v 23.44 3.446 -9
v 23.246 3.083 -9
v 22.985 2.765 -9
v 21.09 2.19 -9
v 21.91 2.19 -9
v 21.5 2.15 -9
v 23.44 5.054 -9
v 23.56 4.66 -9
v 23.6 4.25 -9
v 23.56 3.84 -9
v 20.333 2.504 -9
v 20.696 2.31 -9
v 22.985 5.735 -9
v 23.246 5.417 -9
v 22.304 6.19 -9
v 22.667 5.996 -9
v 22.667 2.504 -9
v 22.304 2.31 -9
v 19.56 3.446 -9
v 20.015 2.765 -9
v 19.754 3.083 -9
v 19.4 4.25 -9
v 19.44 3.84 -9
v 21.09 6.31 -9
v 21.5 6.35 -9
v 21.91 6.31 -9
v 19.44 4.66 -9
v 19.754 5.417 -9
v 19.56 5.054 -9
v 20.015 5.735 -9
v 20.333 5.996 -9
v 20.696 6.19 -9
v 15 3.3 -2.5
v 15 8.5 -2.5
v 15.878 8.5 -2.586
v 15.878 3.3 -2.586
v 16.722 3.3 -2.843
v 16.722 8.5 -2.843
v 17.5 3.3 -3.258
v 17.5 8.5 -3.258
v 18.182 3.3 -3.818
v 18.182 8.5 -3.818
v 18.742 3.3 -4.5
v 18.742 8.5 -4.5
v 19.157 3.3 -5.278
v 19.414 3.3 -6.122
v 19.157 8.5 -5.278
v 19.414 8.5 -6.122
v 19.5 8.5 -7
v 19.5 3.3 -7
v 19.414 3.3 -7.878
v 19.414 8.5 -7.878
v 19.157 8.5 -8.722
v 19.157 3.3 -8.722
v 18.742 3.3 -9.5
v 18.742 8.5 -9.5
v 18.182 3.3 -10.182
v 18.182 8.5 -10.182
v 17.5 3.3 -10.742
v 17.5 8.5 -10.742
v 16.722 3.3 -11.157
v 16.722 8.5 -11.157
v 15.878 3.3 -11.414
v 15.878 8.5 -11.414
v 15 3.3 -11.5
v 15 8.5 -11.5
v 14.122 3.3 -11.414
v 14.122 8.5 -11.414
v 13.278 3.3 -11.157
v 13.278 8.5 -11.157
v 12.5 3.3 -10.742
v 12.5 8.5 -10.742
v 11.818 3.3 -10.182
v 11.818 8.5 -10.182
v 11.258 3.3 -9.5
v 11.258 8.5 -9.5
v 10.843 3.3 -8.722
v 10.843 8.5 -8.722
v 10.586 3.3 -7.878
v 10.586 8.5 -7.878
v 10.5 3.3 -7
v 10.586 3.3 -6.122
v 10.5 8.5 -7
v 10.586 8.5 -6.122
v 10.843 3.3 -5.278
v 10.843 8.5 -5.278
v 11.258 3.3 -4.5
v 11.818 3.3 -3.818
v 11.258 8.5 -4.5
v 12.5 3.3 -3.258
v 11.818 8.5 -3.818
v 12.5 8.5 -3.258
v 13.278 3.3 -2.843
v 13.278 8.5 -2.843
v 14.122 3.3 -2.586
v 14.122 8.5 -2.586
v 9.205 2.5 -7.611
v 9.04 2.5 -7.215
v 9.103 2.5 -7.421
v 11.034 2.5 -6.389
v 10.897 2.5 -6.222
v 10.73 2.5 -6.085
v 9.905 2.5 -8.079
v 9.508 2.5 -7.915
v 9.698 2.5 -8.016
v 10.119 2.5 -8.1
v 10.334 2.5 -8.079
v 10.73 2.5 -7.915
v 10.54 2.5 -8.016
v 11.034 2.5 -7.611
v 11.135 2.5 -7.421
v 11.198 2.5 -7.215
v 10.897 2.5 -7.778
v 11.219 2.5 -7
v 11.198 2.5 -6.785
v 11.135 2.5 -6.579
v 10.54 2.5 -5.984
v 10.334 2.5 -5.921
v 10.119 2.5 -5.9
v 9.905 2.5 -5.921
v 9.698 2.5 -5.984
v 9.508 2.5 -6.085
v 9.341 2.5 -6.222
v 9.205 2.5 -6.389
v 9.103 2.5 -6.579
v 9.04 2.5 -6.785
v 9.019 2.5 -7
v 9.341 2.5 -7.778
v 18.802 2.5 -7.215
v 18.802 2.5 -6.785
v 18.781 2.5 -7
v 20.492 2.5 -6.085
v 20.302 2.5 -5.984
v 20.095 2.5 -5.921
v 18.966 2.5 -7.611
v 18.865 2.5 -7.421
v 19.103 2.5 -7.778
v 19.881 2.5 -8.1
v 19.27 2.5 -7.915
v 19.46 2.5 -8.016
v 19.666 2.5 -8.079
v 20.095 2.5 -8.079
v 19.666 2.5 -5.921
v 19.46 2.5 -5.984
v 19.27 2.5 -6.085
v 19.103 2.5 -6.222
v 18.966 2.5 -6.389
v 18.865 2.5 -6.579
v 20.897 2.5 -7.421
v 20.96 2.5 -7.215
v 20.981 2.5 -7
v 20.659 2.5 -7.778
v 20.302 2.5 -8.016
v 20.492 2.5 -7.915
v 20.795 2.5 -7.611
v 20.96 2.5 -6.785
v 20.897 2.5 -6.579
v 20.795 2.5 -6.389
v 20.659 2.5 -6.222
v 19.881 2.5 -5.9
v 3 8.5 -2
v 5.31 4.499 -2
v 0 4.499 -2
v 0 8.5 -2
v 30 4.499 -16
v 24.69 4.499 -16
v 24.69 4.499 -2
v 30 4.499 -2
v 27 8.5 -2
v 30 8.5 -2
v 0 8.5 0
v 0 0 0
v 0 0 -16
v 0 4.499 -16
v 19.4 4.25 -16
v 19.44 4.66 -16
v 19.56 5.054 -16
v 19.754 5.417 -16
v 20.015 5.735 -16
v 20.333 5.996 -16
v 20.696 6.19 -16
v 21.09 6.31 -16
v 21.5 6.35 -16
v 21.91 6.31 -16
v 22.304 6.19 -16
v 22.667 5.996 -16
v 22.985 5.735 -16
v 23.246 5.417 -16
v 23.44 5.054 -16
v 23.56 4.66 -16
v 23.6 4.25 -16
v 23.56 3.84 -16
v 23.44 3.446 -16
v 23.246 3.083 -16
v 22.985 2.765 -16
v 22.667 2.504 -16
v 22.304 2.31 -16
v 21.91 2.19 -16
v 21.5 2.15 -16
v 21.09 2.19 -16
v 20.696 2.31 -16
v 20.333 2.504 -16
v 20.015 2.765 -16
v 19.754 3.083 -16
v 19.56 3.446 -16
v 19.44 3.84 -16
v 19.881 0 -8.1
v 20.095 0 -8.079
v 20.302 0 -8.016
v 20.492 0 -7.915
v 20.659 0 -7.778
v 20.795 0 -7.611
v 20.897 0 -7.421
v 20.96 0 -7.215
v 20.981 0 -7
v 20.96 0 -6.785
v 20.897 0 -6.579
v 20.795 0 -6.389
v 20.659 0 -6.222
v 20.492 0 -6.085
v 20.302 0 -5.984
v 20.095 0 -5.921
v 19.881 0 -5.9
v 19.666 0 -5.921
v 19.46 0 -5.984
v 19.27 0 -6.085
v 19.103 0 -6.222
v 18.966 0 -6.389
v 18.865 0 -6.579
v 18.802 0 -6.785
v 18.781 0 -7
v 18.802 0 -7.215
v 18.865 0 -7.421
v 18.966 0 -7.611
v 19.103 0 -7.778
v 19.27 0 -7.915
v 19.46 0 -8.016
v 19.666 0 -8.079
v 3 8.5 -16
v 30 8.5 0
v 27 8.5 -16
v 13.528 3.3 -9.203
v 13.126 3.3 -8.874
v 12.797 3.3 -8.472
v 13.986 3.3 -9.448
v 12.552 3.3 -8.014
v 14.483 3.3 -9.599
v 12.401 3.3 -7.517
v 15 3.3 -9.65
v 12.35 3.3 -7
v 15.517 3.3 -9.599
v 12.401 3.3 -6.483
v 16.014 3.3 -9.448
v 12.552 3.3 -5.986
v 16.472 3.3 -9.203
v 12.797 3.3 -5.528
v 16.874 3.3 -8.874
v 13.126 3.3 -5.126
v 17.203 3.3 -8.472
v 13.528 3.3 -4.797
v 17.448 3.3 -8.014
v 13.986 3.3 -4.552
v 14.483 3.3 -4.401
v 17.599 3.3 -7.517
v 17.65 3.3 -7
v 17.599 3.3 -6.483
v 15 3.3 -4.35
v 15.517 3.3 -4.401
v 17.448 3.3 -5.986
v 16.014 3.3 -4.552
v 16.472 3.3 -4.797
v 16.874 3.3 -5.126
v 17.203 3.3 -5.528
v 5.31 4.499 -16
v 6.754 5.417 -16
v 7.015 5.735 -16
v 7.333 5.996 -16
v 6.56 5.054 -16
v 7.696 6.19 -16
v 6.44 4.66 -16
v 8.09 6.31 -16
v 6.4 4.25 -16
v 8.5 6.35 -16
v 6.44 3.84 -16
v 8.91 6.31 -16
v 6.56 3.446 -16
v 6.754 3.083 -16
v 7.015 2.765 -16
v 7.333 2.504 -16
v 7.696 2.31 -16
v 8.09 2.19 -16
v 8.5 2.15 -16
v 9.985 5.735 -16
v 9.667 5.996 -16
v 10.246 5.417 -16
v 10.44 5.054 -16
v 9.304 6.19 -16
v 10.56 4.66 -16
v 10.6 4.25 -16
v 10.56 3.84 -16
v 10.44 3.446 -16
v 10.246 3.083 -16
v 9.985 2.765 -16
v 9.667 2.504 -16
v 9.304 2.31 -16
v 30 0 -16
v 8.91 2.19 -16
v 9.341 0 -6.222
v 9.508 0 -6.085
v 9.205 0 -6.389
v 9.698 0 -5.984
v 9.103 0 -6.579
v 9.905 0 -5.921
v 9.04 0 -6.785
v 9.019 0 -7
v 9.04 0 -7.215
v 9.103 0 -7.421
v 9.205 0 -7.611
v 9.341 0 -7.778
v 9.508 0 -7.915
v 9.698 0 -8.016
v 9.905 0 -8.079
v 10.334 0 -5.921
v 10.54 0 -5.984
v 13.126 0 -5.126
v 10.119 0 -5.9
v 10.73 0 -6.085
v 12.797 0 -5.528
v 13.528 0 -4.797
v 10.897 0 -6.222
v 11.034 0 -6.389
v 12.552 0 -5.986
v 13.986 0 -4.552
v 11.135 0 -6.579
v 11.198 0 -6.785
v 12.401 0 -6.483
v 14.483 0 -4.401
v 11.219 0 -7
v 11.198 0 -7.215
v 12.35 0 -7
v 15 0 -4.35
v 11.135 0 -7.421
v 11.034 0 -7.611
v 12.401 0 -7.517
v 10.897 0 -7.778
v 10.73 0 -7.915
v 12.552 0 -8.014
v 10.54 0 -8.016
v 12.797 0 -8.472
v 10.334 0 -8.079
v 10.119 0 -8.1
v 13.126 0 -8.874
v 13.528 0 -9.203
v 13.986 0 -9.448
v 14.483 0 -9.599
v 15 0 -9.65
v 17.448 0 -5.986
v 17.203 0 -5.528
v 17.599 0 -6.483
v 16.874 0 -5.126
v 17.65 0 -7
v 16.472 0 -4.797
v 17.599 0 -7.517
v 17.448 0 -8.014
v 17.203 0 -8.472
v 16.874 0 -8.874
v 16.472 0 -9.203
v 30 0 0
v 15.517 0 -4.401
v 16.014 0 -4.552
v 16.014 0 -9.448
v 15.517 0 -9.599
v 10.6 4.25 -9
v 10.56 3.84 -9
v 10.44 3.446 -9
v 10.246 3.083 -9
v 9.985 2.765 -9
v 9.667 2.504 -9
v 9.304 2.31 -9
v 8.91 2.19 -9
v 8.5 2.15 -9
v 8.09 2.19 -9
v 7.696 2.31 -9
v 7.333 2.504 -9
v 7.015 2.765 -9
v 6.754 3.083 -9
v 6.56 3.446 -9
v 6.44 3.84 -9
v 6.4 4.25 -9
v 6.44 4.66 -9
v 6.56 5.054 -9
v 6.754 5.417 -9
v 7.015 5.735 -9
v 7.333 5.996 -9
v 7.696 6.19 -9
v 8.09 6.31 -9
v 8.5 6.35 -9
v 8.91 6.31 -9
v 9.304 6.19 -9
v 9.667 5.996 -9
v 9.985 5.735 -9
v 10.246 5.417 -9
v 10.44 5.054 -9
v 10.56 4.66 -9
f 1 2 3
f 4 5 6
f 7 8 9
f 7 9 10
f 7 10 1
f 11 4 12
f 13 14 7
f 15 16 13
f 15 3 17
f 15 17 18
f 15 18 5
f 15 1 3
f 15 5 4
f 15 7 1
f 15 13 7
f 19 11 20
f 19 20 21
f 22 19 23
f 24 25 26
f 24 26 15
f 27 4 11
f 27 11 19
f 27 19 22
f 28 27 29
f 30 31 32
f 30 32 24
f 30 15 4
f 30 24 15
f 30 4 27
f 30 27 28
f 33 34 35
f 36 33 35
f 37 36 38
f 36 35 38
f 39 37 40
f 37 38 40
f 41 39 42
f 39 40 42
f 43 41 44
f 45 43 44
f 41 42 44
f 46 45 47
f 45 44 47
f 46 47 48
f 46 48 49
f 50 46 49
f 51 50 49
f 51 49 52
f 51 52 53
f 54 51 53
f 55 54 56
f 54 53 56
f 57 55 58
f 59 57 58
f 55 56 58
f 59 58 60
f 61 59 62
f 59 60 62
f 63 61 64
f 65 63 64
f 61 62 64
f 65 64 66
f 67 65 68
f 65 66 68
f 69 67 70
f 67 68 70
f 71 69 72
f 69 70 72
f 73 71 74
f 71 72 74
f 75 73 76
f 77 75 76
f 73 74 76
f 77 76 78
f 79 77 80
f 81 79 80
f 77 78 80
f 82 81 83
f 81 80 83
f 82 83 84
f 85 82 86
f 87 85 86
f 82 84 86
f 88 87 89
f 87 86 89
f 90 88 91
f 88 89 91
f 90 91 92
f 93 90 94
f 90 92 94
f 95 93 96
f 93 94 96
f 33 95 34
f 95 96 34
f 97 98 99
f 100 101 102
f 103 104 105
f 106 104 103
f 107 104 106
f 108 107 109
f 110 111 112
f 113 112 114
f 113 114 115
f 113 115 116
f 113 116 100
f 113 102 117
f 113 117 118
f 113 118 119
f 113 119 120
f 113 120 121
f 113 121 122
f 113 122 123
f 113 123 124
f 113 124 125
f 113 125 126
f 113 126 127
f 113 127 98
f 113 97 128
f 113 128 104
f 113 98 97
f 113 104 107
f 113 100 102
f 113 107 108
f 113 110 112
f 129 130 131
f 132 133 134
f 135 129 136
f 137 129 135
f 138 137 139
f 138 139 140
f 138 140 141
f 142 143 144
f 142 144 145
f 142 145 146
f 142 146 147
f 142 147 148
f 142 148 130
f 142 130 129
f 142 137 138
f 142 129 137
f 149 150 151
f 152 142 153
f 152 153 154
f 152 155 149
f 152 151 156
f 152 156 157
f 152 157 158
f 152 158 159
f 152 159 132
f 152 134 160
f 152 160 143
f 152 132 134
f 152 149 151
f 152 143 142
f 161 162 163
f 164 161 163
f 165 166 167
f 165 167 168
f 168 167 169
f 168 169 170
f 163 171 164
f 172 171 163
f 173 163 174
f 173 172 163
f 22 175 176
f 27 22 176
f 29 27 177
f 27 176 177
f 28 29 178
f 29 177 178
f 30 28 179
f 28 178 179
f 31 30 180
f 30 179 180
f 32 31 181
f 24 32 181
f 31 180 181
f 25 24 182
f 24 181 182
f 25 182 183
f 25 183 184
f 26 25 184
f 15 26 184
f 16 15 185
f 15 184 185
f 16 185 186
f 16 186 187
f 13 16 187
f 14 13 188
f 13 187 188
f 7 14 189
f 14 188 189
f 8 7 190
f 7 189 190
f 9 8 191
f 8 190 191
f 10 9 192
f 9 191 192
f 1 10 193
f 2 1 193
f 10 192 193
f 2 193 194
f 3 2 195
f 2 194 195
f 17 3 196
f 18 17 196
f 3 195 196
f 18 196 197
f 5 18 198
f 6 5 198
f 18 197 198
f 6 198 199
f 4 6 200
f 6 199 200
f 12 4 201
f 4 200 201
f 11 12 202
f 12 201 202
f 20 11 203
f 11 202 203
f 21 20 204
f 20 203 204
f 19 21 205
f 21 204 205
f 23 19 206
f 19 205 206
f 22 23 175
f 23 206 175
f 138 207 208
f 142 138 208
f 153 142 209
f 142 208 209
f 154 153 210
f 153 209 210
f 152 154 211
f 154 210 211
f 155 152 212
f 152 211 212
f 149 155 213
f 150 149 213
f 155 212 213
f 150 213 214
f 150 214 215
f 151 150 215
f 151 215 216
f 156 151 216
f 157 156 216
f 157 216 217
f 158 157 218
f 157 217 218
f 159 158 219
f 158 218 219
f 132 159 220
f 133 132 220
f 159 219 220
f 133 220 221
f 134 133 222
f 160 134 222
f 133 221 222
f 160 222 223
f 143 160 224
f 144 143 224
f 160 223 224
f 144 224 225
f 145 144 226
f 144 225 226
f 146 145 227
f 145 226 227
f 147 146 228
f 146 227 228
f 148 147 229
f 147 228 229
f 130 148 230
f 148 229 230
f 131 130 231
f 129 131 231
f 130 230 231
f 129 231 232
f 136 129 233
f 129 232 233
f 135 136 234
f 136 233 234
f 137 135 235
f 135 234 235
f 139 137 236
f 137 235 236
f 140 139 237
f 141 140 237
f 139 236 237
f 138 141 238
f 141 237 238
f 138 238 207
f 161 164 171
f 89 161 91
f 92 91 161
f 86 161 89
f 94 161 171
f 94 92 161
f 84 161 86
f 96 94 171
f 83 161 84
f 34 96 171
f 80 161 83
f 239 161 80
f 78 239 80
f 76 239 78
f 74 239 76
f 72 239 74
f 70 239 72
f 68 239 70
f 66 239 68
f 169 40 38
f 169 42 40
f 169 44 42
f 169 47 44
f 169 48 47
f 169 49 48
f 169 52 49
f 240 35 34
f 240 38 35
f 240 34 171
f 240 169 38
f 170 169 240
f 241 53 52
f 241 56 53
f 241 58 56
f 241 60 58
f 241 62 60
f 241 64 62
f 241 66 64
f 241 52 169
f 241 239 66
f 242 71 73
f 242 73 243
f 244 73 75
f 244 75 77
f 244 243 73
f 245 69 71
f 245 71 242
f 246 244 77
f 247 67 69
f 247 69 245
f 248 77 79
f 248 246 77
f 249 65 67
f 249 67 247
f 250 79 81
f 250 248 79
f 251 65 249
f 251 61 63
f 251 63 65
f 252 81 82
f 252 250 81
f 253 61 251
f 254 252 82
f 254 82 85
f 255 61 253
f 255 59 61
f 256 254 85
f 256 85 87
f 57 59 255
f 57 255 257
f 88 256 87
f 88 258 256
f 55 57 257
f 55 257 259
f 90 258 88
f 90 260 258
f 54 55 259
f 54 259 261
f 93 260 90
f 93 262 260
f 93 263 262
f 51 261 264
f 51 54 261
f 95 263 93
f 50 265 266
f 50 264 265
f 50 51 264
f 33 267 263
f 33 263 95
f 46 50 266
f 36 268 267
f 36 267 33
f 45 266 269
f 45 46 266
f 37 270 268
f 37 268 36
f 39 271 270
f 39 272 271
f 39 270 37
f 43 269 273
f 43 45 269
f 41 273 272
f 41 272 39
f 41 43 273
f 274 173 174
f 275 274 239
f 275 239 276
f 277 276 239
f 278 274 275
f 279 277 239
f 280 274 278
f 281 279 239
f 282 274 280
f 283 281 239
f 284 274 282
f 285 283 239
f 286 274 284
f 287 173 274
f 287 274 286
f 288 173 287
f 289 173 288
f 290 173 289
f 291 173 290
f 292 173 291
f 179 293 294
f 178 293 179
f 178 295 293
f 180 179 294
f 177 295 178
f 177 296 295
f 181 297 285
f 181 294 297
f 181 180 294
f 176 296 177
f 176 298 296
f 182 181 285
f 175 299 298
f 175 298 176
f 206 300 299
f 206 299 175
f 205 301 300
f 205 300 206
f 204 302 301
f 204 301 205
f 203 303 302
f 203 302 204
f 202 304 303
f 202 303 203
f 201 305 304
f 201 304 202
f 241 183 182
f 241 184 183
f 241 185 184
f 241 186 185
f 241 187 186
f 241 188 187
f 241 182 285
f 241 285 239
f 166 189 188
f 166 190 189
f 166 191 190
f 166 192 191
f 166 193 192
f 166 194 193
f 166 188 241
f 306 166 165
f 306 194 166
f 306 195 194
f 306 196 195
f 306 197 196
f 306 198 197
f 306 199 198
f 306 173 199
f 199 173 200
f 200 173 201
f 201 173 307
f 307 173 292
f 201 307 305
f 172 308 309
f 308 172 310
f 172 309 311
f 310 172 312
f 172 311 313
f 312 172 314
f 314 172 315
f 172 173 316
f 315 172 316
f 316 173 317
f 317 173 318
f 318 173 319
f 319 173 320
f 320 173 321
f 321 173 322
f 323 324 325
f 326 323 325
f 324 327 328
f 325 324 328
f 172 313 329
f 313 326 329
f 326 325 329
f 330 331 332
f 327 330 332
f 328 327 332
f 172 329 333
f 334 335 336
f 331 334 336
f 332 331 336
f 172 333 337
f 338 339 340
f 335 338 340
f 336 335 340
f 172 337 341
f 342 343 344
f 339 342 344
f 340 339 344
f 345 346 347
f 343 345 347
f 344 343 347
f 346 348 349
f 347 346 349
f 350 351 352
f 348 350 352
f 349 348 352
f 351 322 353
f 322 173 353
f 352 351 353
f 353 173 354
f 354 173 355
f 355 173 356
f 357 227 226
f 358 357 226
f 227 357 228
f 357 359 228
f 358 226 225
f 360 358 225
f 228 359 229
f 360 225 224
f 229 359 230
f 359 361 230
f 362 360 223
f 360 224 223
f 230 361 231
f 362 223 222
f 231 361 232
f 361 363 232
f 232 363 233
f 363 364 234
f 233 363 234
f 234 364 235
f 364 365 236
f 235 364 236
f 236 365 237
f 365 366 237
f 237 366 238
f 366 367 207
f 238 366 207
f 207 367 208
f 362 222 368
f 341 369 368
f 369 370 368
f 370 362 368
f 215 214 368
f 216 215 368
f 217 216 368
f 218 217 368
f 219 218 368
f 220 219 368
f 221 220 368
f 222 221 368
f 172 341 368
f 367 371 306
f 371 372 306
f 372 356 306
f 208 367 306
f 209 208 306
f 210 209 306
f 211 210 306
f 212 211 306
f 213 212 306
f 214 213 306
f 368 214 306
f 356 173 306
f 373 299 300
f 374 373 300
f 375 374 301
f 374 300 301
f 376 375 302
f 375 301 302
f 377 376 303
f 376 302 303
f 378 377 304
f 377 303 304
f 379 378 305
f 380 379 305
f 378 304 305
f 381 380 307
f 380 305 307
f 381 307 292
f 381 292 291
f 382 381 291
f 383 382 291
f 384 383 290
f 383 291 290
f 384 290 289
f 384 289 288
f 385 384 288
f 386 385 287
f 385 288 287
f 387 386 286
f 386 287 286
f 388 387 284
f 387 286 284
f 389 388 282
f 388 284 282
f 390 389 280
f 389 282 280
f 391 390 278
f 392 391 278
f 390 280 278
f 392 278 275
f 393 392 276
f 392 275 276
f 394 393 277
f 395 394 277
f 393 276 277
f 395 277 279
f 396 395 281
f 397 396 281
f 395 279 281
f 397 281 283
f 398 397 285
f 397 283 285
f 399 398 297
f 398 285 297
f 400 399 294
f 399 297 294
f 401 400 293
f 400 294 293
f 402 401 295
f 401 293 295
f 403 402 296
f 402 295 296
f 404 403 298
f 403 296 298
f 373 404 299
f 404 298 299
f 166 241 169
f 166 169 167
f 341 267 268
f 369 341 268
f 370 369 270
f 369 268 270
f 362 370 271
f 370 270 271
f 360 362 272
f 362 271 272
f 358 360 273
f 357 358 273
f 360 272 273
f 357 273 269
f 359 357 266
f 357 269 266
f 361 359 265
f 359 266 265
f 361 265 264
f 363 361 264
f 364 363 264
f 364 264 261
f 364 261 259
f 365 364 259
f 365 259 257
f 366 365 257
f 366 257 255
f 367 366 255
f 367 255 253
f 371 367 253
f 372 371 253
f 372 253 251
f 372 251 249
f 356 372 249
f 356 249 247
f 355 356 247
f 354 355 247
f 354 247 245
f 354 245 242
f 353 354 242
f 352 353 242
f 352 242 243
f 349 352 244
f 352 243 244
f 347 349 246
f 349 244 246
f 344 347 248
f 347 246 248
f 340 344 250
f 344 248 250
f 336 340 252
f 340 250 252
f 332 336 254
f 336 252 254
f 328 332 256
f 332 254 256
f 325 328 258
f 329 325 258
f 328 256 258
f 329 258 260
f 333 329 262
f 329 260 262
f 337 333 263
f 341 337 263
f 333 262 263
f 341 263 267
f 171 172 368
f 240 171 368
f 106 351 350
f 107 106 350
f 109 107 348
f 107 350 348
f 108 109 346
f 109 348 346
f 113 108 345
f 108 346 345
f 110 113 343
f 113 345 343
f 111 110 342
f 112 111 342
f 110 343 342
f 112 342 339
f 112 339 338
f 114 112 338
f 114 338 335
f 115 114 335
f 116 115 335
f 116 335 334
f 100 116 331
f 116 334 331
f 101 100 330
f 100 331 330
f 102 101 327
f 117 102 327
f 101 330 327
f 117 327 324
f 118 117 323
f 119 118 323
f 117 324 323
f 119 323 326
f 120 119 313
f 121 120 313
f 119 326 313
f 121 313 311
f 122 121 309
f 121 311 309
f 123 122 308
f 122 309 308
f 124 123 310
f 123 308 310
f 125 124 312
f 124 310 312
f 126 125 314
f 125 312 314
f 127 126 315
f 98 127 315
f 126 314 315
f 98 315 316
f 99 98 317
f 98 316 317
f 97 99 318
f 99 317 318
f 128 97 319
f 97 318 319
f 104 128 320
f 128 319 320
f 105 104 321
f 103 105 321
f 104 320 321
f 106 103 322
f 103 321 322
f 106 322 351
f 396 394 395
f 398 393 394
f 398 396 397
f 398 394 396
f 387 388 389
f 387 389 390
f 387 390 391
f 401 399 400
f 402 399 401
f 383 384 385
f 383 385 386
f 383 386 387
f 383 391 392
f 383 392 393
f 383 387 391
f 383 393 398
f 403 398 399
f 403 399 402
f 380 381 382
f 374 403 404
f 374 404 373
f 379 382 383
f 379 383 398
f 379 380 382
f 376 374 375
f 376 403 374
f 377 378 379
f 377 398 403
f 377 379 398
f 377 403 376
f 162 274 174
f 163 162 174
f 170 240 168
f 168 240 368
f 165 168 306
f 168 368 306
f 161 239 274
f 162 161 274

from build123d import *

# Parameters (mm, degrees)
SKETCH1_W           = 30
SKETCH1_H           = 16
BOSS_EXTRUDE1_DEPTH = 8.5
SKETCH2_R           = 4.5
CUT_EXTRUDE1_DEPTH  = 5.2
SKETCH3_R           = 2.65
CUT_EXTRUDE2_DEPTH  = 35.395348523
CUT_EXTRUDE3_DEPTH  = 14
SKETCH5_R           = 2.1
CUT_EXTRUDE4_DEPTH  = 7
SKETCH6_R           = 1.1
CUT_EXTRUDE5_DEPTH  = 2.5


with BuildPart() as part:
    # Sketch1 → Boss-Extrude1 (new body)
    with BuildSketch(Plane(origin=(0, 0, 0), x_dir=(1, 0, 0), z_dir=(0, 1, 0))):
        with Locations((15, 8)):
            Rectangle(SKETCH1_W, SKETCH1_H)
    extrude(amount=BOSS_EXTRUDE1_DEPTH)

    # Sketch2 → Cut-Extrude1 (cut)
    with BuildSketch(Plane(origin=(0, 8.5, 0), x_dir=(1, 0, 0), z_dir=(0, 1, 0))):
        with Locations(Location((15, 7, 0), (0, 0, 270))):
            Circle(SKETCH2_R)
    extrude(amount=-CUT_EXTRUDE1_DEPTH, mode=Mode.SUBTRACT)

    # Sketch3 → Cut-Extrude2 (cut, through all)
    with BuildSketch(Plane(origin=(0, 3.3, 0), x_dir=(1, 0, 0), z_dir=(0, 1, 0))):
        with Locations(Location((15, 7, 0), (0, 0, 270))):
            Circle(SKETCH3_R)
    extrude(amount=-CUT_EXTRUDE2_DEPTH, mode=Mode.SUBTRACT)

    # Sketch4 → Cut-Extrude3 (cut)
    with BuildSketch(Plane(origin=(0, 0, -16), x_dir=(-1, 0, 0), z_dir=(0, 0, -1))):
        Polygon((-27, 8.5), (-24.68995278, 4.498880847), (-30, 4.498880847), (-30, 8.5), align=None)
        Polygon((0, 8.5), (-3, 8.5), (-5.31004722, 4.498880847), (0, 4.498880847), align=None)
    extrude(amount=-CUT_EXTRUDE3_DEPTH, mode=Mode.SUBTRACT)

    # Sketch5 → Cut-Extrude4 (cut)
    with BuildSketch(Plane(origin=(0, 0, -16), x_dir=(-1, 0, 0), z_dir=(0, 0, -1))):
        with Locations((-21.5, 4.25)):
            Circle(SKETCH5_R)
        with Locations(Location((-8.5, 4.25, 0), (0, 0, 180))):
            Circle(SKETCH5_R)
    extrude(amount=-CUT_EXTRUDE4_DEPTH, mode=Mode.SUBTRACT)

    # Sketch6 → Cut-Extrude5 (cut)
    with BuildSketch(Plane.XZ):
        with Locations(Location((10.119225975, -7, 0), (0, 0, 270))):
            Circle(SKETCH6_R)
        with Locations(Location((19.880774025, -7, 0), (0, 0, 270))):
            Circle(SKETCH6_R)
    extrude(amount=-CUT_EXTRUDE5_DEPTH, mode=Mode.SUBTRACT)


solid = part.part
